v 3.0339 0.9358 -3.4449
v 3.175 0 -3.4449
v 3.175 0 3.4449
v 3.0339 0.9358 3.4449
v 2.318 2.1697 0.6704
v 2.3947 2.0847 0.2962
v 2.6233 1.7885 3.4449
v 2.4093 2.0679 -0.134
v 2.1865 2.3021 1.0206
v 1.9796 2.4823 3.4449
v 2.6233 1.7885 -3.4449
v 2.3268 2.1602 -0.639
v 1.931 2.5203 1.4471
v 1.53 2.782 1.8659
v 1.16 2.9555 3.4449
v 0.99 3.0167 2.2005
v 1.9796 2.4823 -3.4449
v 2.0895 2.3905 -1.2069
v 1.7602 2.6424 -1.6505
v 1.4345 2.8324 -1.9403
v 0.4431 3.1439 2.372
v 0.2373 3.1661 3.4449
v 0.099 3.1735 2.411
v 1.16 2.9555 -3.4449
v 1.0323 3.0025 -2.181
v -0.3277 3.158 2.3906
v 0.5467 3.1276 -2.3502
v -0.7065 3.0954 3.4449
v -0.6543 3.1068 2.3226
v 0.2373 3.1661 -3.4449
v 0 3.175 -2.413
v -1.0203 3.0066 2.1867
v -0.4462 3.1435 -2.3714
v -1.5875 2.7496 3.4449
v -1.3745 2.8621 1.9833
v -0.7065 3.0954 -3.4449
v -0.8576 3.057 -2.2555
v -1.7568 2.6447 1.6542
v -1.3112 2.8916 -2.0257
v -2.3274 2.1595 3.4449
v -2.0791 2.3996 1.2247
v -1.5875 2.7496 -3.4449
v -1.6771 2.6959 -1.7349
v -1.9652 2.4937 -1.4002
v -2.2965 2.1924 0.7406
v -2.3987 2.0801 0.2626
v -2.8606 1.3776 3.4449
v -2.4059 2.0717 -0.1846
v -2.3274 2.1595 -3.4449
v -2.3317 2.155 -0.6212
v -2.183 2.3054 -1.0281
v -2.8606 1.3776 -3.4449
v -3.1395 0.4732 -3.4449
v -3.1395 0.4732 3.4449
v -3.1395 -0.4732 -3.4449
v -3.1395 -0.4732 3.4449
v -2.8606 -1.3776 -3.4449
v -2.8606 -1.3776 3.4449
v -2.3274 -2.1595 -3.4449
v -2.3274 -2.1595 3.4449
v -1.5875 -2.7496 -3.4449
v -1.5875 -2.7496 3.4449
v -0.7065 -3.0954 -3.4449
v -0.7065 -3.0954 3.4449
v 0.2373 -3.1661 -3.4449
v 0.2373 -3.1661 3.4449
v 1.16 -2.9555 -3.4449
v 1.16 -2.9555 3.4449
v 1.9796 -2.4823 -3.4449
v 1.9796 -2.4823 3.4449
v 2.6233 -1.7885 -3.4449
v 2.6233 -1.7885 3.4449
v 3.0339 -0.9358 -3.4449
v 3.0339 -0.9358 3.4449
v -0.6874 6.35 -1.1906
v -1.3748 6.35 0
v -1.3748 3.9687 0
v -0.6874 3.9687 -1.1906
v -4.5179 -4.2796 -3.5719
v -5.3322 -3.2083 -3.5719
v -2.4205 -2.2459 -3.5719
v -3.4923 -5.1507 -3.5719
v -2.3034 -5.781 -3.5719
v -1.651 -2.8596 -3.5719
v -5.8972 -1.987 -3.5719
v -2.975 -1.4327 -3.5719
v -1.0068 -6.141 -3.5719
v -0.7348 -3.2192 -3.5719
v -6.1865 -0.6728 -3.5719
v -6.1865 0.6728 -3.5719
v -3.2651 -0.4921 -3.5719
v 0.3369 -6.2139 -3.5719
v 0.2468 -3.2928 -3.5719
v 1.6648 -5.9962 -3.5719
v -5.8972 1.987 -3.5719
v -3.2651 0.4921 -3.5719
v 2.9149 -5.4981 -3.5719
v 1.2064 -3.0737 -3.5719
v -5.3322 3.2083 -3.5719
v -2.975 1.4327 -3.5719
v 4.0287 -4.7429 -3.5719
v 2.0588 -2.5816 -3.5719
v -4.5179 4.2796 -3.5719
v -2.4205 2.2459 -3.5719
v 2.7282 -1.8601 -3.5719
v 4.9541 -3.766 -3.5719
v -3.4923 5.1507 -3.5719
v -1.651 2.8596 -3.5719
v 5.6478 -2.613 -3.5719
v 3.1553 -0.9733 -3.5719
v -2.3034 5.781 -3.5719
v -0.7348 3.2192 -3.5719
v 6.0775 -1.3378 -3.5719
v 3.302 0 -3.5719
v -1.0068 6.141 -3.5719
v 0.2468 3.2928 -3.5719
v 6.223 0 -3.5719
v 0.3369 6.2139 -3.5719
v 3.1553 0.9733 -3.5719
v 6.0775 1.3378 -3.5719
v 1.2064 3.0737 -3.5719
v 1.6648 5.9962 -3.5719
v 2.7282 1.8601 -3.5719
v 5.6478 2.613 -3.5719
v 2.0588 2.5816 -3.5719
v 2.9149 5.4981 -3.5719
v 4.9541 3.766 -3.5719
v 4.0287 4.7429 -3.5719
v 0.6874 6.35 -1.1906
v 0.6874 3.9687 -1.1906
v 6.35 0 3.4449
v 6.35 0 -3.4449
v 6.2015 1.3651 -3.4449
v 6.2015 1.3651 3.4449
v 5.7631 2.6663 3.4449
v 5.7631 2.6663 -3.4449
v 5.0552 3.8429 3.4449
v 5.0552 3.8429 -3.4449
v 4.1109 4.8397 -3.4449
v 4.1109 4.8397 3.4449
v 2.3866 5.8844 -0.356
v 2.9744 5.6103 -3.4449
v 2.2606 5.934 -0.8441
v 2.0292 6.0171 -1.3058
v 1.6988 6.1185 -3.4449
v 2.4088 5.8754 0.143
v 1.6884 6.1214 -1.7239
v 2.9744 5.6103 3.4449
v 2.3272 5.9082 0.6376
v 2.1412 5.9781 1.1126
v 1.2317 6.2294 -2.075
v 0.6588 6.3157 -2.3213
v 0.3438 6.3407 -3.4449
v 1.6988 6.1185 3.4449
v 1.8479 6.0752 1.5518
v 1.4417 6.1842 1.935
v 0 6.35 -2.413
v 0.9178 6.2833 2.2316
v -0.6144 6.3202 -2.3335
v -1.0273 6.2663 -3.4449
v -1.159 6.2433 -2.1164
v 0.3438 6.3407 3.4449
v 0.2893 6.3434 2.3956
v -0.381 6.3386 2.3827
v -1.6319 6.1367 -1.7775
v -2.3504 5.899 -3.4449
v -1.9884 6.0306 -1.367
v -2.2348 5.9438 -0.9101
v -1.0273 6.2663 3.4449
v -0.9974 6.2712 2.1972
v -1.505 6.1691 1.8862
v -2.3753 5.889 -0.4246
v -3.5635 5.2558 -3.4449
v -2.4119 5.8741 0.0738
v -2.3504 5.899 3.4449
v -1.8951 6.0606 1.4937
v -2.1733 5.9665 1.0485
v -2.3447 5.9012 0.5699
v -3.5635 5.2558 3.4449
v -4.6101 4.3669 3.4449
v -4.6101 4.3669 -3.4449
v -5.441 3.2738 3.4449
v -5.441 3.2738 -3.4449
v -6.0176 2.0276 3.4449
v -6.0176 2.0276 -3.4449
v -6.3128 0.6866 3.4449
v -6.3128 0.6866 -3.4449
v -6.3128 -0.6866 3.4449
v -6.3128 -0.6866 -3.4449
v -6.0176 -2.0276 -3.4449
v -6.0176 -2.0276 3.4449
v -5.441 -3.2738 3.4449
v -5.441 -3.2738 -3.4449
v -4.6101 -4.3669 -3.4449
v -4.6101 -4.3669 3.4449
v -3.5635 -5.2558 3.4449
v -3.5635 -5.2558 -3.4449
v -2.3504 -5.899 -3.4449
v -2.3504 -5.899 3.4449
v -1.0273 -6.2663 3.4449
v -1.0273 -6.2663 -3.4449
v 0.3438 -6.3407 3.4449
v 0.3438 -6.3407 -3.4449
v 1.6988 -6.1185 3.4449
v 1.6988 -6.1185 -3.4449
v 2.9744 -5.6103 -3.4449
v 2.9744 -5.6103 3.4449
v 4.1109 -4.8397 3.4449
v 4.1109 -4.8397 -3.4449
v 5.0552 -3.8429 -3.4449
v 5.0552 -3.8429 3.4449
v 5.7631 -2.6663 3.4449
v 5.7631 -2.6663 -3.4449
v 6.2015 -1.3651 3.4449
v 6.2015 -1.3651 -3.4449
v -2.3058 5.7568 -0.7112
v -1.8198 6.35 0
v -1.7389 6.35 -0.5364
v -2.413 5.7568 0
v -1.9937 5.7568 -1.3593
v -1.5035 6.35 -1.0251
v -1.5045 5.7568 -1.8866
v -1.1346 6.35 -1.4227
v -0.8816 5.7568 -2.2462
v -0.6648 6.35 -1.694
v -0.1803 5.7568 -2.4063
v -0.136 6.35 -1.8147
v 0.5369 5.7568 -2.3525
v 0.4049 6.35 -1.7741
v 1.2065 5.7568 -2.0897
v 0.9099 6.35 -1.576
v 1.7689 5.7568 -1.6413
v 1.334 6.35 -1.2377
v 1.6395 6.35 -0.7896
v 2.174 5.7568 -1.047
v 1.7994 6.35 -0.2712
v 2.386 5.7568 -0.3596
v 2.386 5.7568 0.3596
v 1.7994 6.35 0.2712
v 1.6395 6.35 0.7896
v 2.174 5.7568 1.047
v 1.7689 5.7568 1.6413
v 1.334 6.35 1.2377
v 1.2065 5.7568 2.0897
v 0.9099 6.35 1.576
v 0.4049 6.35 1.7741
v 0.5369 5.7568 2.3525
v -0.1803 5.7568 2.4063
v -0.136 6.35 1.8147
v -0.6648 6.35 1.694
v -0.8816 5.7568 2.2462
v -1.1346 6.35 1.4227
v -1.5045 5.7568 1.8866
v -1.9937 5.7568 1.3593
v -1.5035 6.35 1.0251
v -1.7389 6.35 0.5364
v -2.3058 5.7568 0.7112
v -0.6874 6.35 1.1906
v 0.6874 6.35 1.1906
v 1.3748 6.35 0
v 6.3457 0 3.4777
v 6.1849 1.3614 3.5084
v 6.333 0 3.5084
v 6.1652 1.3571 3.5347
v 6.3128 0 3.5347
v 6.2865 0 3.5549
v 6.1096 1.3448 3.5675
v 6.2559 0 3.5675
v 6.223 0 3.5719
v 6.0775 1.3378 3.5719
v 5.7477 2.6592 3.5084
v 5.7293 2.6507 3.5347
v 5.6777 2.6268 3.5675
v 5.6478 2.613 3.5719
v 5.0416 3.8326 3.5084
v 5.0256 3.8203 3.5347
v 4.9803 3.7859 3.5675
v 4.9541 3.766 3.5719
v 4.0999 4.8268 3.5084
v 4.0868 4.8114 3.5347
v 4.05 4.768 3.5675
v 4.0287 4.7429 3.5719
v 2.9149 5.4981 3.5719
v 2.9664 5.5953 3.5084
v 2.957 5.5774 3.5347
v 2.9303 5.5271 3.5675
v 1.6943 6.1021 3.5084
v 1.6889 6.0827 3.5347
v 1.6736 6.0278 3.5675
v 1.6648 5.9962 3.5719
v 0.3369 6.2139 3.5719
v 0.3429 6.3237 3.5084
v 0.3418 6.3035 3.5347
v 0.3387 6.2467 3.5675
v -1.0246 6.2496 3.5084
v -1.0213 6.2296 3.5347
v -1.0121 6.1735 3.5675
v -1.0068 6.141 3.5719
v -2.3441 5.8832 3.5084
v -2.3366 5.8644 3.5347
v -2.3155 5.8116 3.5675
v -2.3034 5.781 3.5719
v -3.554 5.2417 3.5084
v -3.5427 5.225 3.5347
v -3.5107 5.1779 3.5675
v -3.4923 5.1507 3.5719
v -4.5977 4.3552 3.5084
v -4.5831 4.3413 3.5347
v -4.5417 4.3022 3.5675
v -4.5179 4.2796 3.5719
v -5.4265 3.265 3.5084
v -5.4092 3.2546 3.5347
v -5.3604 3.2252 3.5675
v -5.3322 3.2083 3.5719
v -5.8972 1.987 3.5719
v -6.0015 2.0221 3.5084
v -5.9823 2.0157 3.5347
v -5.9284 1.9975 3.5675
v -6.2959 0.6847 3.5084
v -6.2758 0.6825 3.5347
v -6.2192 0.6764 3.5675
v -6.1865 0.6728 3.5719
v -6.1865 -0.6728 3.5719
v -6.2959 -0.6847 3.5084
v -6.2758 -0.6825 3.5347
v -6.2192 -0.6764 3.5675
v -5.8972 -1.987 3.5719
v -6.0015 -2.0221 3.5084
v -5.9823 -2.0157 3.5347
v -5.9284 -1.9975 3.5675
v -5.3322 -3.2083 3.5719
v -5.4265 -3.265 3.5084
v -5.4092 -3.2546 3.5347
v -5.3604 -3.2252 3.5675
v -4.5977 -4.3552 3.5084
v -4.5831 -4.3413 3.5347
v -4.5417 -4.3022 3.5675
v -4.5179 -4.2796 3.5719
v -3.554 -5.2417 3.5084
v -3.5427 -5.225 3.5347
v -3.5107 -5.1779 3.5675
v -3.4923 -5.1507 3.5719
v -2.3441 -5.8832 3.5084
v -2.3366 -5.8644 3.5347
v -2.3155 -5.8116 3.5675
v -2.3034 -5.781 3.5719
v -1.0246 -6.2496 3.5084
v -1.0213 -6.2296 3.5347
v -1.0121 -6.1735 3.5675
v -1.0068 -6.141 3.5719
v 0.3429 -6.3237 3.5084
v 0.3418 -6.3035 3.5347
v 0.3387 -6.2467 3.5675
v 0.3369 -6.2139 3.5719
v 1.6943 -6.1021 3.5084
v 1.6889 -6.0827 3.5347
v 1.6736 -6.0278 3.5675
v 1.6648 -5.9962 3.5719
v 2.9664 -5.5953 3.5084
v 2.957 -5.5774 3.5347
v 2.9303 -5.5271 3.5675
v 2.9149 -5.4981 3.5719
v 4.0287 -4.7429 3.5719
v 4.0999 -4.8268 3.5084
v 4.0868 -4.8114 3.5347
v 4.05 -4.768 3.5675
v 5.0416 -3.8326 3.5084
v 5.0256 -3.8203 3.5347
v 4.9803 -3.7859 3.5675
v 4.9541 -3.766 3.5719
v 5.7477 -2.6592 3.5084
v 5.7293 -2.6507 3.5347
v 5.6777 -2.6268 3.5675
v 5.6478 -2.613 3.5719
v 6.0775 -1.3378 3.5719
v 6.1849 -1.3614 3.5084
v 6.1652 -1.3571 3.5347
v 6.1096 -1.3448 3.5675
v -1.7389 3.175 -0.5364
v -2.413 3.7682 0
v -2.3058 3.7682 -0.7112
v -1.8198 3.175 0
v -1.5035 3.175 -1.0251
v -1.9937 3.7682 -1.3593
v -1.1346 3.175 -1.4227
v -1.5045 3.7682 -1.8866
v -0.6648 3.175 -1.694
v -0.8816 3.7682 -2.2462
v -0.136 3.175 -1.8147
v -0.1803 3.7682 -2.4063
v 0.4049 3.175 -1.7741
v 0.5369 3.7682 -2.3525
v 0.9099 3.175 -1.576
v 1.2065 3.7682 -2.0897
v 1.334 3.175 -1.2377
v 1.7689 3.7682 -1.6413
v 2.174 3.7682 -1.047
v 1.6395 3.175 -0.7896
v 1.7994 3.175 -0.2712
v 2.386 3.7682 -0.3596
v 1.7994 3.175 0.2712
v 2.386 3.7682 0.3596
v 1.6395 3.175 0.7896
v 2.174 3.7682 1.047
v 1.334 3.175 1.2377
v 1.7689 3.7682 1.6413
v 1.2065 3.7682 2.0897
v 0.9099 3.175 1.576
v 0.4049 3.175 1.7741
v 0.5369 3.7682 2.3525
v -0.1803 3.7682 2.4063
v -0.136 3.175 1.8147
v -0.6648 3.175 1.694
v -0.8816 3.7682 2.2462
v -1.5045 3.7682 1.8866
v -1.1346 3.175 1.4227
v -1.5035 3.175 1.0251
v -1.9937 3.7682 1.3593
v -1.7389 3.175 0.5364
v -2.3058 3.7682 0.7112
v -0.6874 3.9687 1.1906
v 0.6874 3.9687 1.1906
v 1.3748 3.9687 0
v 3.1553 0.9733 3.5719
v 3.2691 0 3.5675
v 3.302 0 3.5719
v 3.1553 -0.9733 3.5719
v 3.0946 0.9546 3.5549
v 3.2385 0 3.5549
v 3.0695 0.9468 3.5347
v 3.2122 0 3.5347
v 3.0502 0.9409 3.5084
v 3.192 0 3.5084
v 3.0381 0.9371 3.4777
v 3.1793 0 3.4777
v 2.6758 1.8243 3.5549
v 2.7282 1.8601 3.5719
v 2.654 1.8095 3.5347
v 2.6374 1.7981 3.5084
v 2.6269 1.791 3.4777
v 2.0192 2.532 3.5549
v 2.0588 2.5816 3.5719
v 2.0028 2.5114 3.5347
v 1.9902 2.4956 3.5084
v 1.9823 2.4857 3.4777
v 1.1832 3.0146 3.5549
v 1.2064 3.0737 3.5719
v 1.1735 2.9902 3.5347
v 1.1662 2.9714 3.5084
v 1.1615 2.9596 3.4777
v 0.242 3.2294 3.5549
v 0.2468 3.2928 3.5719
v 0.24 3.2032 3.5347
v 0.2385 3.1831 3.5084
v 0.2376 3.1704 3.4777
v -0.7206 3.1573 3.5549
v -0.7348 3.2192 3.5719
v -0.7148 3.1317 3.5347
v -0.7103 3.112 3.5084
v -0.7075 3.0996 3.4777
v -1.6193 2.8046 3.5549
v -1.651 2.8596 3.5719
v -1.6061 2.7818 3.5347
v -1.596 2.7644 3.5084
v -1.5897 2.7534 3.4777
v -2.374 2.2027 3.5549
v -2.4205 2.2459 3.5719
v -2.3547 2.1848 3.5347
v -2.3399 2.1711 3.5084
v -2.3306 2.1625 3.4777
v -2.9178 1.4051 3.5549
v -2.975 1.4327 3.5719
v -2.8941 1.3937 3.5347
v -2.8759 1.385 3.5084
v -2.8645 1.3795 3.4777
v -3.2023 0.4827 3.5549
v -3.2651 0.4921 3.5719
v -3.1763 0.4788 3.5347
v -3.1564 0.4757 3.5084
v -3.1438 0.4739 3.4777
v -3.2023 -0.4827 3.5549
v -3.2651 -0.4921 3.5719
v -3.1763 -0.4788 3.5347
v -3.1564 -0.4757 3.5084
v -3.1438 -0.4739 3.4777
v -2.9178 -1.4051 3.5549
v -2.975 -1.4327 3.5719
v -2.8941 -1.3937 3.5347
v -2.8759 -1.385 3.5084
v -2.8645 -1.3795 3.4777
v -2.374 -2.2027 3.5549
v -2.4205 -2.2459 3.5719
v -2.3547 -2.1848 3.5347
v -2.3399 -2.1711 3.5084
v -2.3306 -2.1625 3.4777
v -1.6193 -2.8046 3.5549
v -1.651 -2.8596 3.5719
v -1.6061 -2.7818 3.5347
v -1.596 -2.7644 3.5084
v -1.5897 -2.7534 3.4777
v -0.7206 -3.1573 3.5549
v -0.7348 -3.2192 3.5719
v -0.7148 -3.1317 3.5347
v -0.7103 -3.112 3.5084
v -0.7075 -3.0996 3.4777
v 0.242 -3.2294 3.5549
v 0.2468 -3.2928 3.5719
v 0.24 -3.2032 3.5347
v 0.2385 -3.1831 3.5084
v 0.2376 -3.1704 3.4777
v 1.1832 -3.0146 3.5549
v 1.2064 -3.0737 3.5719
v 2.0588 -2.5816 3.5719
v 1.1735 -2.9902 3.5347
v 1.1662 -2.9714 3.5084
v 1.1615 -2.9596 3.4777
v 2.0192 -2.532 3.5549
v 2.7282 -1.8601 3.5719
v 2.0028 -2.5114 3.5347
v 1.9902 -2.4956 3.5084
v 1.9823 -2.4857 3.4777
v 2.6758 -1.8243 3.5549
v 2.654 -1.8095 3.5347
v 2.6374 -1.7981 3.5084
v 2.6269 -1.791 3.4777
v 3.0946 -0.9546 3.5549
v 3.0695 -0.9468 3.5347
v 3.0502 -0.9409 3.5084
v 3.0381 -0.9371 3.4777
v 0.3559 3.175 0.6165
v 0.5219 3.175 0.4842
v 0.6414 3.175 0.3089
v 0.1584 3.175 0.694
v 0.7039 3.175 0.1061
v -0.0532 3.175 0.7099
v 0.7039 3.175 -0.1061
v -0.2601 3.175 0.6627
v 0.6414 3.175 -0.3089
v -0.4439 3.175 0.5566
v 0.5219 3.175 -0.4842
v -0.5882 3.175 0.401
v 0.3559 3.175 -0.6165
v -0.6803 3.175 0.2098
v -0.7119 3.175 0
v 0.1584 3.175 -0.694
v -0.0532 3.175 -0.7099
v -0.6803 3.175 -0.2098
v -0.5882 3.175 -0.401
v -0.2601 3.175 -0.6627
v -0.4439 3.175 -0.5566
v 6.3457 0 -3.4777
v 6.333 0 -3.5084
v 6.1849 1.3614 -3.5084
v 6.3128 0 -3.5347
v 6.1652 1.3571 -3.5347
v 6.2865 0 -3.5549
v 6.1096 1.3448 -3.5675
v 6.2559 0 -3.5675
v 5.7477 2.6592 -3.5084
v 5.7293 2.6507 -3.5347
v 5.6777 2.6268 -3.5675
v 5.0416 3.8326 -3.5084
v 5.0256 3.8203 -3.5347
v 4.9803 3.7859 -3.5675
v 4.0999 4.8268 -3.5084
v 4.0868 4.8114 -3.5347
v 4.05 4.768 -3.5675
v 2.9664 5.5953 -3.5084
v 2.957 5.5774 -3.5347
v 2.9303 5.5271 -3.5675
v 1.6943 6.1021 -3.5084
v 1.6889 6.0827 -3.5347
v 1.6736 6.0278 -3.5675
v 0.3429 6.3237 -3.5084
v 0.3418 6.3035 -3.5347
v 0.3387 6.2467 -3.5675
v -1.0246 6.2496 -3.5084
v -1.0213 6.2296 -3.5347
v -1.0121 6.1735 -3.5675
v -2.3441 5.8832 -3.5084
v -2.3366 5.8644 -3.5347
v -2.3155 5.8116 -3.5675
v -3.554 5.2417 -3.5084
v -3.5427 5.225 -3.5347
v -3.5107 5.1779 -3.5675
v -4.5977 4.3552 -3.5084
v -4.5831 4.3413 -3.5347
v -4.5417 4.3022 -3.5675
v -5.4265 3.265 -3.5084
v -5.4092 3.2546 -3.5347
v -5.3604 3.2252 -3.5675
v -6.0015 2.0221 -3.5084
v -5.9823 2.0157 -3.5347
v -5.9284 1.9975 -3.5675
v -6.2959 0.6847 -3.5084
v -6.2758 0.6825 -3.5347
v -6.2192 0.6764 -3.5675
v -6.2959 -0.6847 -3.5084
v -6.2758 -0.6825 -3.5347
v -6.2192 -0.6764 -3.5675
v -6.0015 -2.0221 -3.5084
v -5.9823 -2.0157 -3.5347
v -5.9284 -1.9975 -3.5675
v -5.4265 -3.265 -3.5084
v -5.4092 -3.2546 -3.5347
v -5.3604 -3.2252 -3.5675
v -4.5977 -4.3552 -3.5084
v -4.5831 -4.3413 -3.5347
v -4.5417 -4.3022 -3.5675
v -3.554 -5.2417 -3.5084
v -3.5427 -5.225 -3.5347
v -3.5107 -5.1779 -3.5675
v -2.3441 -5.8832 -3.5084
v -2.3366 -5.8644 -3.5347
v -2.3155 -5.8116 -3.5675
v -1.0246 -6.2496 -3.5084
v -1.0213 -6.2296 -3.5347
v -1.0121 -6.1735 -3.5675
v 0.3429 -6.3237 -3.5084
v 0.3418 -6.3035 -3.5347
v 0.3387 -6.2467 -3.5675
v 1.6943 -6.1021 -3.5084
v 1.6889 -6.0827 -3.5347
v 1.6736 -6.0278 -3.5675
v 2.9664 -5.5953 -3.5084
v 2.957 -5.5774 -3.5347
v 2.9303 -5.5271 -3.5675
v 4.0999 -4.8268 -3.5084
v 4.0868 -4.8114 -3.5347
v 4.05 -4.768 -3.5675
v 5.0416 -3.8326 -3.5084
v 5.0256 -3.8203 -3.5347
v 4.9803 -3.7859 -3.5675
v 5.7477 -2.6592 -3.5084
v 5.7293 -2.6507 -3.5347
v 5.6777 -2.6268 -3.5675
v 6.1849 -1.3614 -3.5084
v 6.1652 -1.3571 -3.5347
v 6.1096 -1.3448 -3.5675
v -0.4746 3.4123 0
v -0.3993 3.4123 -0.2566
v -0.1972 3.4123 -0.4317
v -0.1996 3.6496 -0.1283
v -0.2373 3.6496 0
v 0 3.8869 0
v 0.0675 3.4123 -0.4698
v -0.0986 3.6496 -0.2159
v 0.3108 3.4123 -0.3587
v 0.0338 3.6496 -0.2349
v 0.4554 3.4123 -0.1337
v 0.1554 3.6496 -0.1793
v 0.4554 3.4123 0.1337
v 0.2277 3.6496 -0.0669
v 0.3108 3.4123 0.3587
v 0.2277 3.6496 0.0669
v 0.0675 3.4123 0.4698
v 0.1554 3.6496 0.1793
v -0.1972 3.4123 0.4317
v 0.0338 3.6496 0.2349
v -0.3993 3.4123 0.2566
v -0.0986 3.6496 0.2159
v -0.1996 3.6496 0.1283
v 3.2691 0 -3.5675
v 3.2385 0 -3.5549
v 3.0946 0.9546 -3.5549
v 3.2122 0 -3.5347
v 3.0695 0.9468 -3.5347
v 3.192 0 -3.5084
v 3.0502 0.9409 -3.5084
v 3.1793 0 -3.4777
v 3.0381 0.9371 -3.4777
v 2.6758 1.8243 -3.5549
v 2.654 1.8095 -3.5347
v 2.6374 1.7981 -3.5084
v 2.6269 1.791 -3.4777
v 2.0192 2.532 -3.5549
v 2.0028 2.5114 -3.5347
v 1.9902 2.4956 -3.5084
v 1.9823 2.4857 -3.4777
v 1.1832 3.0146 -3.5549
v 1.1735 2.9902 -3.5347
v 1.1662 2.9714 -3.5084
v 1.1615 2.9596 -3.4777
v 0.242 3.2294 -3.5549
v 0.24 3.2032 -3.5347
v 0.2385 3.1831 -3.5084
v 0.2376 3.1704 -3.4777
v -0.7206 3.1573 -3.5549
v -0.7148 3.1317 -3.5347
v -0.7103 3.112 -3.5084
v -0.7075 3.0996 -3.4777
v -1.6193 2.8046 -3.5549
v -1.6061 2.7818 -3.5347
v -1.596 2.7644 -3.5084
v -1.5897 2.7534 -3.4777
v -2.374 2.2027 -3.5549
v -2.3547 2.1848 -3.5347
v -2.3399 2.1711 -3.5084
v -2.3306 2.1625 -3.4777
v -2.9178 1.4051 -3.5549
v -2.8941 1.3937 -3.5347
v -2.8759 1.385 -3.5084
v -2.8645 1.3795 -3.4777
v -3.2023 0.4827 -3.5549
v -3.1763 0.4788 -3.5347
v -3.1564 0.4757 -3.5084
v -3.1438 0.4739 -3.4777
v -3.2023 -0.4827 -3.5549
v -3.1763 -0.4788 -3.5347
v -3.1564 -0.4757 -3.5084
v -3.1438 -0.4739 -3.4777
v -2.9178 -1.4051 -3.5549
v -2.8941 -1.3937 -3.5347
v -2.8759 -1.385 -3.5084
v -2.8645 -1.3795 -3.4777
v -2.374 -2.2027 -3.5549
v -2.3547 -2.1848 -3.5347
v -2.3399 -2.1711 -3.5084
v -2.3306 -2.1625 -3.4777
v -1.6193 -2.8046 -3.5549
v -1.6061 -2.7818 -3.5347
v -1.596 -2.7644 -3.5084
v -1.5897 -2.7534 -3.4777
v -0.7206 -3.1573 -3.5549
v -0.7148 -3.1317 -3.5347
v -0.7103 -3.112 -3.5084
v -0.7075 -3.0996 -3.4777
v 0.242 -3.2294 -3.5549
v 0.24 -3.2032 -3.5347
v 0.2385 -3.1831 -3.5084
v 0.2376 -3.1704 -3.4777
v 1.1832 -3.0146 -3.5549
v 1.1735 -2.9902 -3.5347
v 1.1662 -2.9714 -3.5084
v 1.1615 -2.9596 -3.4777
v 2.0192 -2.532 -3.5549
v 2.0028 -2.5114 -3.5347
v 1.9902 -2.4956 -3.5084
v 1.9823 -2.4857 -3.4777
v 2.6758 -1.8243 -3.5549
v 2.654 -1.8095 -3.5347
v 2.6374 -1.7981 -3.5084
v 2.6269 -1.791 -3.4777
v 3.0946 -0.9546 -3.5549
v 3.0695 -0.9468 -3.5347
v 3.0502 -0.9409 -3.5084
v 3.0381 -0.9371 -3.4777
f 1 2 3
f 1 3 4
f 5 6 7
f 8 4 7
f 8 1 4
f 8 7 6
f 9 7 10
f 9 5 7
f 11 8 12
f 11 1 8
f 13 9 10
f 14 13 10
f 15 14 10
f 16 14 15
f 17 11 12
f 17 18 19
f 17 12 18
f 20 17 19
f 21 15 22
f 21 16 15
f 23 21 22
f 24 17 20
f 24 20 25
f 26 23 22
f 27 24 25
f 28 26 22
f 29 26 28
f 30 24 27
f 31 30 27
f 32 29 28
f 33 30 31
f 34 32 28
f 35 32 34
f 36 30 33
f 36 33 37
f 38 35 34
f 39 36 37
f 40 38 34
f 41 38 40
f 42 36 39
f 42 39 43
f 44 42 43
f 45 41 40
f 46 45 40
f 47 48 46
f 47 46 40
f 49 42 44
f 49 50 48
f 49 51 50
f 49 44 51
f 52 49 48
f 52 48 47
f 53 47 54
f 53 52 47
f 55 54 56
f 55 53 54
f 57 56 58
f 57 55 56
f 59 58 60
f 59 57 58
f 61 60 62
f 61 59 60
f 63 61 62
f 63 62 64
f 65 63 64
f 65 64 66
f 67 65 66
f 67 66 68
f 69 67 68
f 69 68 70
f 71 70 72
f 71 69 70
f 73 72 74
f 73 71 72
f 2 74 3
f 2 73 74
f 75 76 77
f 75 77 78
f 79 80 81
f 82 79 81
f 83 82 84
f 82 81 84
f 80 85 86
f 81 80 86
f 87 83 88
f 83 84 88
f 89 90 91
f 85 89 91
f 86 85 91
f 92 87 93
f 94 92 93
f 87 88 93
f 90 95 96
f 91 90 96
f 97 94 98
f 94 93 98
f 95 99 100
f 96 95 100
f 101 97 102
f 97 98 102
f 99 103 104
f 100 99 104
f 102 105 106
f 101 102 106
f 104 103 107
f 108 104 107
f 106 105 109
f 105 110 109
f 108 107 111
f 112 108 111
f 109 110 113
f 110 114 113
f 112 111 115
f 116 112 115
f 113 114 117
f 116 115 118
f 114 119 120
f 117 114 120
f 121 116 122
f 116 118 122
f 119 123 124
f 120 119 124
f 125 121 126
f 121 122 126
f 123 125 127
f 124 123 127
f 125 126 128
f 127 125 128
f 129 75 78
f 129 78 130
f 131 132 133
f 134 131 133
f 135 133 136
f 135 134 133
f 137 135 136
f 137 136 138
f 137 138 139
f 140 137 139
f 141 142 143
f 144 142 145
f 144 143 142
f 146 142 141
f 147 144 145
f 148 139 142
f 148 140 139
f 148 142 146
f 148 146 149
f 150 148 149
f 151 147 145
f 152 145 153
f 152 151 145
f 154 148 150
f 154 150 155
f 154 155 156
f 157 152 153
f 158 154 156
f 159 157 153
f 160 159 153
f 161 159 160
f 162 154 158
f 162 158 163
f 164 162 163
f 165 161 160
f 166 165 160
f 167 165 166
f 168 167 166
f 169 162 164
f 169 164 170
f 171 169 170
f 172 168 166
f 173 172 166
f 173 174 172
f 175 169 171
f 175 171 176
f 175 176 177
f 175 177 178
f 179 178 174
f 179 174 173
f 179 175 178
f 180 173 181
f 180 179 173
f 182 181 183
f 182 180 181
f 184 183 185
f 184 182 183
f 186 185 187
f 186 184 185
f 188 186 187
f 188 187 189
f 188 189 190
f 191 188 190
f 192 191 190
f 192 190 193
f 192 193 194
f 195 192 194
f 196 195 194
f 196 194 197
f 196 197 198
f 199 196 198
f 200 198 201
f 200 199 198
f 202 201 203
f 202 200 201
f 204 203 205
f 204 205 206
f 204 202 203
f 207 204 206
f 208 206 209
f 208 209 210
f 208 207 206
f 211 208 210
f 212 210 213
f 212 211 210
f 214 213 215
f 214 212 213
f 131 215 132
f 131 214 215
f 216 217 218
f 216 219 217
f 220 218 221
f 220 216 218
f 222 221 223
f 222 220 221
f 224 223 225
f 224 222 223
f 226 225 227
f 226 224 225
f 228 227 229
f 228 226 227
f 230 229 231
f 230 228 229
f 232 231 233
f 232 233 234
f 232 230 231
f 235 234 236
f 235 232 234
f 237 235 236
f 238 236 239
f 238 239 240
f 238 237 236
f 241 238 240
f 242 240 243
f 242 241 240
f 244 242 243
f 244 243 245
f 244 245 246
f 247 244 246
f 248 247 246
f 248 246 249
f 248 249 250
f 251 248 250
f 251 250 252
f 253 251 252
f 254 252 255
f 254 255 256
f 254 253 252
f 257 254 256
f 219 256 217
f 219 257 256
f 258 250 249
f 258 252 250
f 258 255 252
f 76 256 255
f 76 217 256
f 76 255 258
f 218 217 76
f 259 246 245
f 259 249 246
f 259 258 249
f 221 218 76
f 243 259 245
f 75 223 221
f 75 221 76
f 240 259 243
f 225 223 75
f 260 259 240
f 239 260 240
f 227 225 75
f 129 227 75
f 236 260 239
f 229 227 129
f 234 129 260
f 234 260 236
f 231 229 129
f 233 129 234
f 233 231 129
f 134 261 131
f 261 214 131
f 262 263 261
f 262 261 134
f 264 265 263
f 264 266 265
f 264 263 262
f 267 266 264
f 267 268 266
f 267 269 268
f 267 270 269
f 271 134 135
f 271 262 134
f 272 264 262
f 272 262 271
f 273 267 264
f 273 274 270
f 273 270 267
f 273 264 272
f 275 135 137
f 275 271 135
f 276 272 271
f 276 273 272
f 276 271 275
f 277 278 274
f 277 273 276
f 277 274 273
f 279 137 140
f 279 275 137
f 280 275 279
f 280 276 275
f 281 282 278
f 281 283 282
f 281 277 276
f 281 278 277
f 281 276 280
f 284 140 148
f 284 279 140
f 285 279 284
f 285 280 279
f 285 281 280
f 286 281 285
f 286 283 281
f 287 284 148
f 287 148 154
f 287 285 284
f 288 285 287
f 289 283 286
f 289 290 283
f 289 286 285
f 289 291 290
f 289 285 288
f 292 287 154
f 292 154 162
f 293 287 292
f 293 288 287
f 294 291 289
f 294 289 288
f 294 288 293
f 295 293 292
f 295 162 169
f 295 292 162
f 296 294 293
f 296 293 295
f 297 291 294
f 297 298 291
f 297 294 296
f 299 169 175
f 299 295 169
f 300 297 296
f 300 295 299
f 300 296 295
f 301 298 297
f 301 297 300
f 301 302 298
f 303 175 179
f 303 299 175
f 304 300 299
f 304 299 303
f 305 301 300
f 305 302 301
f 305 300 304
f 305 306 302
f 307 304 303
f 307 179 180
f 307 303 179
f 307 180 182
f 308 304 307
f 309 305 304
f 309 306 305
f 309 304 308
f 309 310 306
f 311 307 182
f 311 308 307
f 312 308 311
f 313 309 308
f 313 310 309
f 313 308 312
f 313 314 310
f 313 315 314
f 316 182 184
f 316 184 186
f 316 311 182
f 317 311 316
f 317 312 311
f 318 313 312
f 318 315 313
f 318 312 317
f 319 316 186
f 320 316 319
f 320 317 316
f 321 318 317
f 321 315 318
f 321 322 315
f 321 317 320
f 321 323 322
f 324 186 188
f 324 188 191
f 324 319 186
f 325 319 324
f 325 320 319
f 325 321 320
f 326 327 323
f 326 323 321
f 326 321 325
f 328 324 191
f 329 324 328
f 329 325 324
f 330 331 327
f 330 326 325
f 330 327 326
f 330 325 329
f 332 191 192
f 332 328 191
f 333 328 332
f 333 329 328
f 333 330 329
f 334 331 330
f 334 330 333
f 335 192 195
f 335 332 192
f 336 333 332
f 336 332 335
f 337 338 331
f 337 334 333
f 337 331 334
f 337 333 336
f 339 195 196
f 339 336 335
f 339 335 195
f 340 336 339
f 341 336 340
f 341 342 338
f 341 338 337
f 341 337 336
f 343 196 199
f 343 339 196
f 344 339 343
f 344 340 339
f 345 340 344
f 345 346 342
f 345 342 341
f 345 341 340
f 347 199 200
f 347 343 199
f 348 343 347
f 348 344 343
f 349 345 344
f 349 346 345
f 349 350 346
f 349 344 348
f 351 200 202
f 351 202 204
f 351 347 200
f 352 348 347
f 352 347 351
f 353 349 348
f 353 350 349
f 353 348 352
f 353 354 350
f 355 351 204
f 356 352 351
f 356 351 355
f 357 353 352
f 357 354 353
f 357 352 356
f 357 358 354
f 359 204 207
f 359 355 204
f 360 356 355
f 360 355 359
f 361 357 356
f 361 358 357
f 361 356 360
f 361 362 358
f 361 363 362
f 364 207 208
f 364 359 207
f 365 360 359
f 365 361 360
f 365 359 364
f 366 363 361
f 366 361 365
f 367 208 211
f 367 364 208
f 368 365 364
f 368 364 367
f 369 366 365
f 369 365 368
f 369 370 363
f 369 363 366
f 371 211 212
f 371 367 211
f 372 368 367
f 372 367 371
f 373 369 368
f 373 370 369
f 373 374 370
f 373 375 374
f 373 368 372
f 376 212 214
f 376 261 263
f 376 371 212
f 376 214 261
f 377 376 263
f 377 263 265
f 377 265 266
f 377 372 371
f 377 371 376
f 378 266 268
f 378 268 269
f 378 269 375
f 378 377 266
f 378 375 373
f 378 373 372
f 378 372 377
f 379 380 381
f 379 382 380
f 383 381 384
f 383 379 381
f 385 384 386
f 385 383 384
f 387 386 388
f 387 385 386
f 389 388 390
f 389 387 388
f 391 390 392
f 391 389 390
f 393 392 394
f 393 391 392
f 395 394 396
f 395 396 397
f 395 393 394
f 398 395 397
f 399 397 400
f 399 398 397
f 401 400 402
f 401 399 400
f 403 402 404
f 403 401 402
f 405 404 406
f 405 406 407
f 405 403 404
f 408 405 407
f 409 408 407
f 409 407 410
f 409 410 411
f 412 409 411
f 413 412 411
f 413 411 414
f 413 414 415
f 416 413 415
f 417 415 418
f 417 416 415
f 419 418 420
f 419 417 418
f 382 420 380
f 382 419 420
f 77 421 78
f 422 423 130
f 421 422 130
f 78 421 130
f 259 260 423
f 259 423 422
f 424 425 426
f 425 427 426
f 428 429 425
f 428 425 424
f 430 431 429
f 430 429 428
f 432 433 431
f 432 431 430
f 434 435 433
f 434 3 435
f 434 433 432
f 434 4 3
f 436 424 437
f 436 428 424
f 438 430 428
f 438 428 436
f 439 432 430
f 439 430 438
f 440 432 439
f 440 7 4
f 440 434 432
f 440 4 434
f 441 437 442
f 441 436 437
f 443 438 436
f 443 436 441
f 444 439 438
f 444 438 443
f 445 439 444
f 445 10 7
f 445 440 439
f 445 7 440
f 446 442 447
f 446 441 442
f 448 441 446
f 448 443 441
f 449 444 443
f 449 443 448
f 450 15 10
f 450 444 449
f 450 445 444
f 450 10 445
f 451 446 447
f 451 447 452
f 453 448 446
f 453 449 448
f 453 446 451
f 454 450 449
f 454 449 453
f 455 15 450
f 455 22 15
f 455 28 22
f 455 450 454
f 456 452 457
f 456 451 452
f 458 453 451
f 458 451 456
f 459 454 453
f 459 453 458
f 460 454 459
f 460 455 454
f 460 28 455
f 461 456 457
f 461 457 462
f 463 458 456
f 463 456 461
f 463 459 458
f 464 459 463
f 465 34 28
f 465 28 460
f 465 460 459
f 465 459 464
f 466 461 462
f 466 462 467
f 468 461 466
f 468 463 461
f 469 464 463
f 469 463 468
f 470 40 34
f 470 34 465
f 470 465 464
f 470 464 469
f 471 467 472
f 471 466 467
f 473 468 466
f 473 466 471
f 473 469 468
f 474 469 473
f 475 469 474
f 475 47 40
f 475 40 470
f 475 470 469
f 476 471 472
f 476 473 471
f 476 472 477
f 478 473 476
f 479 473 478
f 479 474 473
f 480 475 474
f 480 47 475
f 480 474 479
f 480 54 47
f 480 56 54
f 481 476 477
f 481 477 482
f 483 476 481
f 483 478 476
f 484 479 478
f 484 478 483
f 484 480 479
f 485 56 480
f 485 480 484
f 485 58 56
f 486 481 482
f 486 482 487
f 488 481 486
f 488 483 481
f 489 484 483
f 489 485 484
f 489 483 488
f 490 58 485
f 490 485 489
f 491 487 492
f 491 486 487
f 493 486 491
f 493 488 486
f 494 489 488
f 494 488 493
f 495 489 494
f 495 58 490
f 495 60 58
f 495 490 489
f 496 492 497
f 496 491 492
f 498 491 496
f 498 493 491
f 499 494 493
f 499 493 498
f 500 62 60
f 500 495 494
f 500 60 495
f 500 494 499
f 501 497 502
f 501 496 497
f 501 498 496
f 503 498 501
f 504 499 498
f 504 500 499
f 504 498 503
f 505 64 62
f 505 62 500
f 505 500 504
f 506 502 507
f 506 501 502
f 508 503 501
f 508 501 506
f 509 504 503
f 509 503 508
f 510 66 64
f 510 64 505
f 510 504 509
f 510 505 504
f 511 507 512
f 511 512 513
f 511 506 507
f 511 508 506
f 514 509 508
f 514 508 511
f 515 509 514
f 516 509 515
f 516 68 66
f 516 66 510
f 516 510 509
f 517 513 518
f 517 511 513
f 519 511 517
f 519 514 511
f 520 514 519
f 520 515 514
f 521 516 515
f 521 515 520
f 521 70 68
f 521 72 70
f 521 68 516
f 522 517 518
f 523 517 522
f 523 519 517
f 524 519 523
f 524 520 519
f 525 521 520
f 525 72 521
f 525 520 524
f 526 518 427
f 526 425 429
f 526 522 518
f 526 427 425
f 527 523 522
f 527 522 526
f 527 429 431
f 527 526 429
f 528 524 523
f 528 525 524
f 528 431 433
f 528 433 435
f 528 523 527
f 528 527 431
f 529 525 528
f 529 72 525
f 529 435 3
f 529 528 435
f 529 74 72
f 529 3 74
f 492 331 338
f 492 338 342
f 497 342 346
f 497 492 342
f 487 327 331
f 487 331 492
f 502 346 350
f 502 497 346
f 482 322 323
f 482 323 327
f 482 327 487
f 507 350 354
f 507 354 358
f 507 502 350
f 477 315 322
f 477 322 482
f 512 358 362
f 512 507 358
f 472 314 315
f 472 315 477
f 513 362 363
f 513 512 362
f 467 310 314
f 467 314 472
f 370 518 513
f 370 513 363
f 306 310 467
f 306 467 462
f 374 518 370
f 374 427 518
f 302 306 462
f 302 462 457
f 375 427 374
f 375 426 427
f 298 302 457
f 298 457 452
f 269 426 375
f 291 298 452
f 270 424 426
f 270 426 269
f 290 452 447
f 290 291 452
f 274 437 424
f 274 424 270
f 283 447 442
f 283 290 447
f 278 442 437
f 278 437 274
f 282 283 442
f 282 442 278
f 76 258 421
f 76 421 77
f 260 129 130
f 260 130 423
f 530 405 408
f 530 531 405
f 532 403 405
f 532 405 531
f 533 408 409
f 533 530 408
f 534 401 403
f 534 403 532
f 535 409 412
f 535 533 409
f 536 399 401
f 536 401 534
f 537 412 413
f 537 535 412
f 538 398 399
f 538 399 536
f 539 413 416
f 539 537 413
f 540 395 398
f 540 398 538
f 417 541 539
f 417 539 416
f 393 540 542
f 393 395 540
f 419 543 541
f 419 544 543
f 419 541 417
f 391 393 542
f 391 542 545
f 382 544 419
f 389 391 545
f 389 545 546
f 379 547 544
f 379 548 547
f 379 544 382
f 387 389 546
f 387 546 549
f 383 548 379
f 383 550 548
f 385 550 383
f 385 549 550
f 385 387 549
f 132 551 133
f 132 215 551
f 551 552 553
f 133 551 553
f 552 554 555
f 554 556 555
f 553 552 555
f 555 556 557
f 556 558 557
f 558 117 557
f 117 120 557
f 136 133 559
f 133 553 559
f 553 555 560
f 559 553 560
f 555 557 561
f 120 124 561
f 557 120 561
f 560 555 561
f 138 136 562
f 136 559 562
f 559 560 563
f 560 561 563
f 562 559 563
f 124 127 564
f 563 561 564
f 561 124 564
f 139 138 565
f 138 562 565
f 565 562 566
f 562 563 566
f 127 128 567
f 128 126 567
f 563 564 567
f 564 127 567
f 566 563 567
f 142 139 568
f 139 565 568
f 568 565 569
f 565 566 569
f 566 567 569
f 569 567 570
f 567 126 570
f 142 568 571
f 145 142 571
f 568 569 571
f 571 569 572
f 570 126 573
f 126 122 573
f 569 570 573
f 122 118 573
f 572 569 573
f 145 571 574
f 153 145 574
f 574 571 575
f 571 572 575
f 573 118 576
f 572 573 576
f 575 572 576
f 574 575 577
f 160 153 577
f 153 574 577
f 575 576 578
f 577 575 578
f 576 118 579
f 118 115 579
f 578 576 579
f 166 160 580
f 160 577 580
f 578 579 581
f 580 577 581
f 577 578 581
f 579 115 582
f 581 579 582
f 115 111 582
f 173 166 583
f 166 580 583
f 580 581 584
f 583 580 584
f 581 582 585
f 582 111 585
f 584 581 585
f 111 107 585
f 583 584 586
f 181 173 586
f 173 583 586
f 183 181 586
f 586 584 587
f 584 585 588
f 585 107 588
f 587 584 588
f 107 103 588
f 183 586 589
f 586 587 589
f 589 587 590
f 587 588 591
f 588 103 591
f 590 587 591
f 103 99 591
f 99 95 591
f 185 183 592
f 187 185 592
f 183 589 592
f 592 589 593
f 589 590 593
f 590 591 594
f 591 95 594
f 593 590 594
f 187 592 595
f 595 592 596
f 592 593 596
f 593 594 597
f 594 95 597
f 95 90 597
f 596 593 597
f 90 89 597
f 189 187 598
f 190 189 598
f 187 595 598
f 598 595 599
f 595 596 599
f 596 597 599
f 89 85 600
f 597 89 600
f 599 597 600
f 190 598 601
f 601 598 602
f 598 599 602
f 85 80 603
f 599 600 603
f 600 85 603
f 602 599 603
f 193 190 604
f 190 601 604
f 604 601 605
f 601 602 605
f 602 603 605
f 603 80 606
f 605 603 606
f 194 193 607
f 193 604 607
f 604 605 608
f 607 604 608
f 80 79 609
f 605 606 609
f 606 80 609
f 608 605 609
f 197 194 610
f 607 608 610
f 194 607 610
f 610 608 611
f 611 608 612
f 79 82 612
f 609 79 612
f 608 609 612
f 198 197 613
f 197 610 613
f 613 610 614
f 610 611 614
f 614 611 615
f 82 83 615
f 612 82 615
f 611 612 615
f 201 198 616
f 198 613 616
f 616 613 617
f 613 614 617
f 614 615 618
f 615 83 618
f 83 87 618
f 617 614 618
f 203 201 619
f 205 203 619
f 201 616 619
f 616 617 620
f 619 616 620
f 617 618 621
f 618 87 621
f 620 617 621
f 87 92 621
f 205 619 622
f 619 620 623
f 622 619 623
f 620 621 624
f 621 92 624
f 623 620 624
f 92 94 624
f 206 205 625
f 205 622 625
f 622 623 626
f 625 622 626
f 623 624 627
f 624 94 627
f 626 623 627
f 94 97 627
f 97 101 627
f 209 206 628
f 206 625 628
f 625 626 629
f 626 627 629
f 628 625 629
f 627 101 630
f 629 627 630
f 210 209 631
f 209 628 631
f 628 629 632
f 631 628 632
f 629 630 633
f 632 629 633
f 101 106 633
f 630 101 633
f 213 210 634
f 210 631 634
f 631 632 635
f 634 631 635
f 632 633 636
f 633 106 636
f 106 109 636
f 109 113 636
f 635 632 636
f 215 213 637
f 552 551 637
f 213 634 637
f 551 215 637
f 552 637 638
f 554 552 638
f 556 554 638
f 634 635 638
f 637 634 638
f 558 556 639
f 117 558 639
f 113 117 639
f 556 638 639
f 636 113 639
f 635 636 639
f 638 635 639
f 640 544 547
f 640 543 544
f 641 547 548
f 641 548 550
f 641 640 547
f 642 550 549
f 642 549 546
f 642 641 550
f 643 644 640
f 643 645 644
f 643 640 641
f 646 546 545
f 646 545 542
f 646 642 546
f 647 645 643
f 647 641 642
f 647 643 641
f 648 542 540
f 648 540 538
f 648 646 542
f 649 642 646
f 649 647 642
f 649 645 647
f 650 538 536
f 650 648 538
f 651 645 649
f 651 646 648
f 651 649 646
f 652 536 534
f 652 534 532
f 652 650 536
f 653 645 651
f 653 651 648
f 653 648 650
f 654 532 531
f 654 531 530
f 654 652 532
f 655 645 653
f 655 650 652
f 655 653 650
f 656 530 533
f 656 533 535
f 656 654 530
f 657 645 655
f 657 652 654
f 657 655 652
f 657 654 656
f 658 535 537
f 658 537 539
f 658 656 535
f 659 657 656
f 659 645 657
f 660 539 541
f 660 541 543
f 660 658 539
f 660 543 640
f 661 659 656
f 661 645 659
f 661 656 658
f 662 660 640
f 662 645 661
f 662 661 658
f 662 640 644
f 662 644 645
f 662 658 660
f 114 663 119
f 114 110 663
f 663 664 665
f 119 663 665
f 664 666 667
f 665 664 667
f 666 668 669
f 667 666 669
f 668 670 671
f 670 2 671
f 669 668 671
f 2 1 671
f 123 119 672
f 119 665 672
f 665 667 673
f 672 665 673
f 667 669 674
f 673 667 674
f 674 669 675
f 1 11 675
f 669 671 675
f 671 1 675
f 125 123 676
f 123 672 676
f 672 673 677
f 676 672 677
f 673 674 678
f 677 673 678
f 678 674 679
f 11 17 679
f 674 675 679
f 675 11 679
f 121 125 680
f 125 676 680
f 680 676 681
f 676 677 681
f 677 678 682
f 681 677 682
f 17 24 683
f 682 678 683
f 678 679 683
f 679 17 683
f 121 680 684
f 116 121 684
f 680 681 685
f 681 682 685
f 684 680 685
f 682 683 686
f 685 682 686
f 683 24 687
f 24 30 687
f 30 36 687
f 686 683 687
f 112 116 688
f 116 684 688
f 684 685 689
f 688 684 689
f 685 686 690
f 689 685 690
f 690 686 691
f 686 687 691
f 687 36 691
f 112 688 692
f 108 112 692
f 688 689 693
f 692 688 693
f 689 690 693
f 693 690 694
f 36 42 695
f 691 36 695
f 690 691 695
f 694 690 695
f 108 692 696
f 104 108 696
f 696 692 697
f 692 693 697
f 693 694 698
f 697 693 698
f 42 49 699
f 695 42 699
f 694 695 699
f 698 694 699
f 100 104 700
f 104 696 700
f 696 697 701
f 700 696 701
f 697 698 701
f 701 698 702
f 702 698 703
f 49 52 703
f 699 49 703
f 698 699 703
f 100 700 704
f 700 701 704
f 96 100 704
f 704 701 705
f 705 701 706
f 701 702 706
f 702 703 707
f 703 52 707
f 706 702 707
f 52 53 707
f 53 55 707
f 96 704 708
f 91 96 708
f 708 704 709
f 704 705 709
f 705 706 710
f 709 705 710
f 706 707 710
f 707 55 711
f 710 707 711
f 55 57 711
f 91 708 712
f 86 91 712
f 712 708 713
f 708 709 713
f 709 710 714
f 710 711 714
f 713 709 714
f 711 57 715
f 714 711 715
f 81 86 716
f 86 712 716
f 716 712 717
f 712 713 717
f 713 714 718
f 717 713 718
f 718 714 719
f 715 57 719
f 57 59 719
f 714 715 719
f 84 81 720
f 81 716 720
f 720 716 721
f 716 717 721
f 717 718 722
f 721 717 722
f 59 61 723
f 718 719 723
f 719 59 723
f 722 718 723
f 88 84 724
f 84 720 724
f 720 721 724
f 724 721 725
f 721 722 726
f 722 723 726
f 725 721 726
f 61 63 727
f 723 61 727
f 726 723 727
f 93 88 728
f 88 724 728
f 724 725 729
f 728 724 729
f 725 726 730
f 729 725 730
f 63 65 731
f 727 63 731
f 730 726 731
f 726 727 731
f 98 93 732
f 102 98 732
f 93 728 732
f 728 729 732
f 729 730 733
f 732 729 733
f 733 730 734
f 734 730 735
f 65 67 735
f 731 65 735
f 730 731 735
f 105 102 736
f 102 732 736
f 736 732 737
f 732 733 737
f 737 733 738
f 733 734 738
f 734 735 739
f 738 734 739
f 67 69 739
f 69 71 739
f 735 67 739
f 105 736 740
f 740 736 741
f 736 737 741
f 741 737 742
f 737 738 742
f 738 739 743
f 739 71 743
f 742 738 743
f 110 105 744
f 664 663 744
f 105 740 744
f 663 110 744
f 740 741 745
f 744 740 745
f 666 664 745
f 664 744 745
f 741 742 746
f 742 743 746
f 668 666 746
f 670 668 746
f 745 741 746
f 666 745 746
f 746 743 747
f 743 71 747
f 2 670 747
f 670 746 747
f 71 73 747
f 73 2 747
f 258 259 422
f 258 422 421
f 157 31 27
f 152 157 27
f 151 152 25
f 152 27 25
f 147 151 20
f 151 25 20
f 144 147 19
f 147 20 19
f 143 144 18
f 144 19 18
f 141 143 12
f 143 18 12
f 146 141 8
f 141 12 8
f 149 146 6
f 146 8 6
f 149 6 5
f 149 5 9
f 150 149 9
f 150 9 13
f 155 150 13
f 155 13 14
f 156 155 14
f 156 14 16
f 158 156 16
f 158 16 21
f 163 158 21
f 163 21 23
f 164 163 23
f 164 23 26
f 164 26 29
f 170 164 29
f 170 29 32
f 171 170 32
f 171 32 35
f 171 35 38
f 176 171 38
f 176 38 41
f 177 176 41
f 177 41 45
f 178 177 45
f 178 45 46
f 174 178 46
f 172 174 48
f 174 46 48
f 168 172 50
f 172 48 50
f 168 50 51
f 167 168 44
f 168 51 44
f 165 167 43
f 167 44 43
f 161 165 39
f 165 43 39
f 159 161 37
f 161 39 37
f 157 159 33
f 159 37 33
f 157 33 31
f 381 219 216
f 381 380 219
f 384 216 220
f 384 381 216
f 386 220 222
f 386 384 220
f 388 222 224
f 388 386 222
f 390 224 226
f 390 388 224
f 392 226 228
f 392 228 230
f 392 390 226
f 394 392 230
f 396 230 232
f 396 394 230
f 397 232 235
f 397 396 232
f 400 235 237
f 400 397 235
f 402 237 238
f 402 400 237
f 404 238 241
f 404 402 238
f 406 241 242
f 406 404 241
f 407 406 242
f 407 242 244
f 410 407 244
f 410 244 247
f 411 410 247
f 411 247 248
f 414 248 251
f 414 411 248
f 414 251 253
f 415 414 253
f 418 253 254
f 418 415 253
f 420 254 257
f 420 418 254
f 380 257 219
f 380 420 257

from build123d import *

# Parameters (mm, degrees)
SKETCH1_R          = 6.35
SKETCH1_R_2        = 3.175
EXTRUDE1_DEPTH     = 3.571875
SKETCH2_R          = 2.413
CUT_EXTRUDE1_DEPTH = 7.35
FILLET1_R          = 0.127
CUT_EXTRUDE2_DEPTH = 2.38125


with BuildPart() as part:
    # Sketch1 → Extrude1 (new body, symmetric)
    with BuildSketch(Plane.XY):
        Circle(SKETCH1_R)
        Circle(SKETCH1_R_2, mode=Mode.SUBTRACT)
    extrude(amount=EXTRUDE1_DEPTH, both=True)

    # Sketch2 → Cut-Extrude1 (cut, through all)
    with BuildSketch(Plane(origin=(41.275, 0, 0), x_dir=(0, 0, -1), z_dir=(0, -1, 0))):
        with Locations((0, -41.275)):
            Circle(SKETCH2_R)
    extrude(amount=-CUT_EXTRUDE1_DEPTH, mode=Mode.SUBTRACT)

    # Fillet1
    fillet1_edges = [part.edges().sort_by_distance(p)[0] for p in [
        (-6.35, 0, -3.571875),
        (-6.35, 0, 3.571875),
        (-3.175, 0, -3.571875),
        (-3.175, 0, 3.571875),
    ]]
    fillet(fillet1_edges, radius=FILLET1_R)


with BuildPart() as body_2:
    # Sketch3 → Revolve1 (revolve)
    with BuildSketch(Plane.XY):
        Polygon((-1.819751616, 3.175), (-0.71189806, 3.175), (0, 3.88689806), (0, 6.35), (-1.819751616, 6.35), (-2.413, 5.756751616), (-2.413, 3.768248384), align=None)
    revolve(axis=Axis((0, 3.175, 0), (0, -1, 0)))

    # Sketch4 → Cut-Extrude2 (cut)
    with BuildSketch(Plane(origin=(3.3734375, 6.35, 0), x_dir=(0, 0, -1), z_dir=(0, -1, 0))):
        Polygon((0, -1.998622171), (-1.190625, -2.686029836), (-1.190625, -4.060845164), (0, -4.748252829), (1.190625, -4.060845164), (1.190625, -2.686029836), align=None)
    extrude(amount=CUT_EXTRUDE2_DEPTH, mode=Mode.SUBTRACT)


solid = Compound([part.part, body_2.part])
